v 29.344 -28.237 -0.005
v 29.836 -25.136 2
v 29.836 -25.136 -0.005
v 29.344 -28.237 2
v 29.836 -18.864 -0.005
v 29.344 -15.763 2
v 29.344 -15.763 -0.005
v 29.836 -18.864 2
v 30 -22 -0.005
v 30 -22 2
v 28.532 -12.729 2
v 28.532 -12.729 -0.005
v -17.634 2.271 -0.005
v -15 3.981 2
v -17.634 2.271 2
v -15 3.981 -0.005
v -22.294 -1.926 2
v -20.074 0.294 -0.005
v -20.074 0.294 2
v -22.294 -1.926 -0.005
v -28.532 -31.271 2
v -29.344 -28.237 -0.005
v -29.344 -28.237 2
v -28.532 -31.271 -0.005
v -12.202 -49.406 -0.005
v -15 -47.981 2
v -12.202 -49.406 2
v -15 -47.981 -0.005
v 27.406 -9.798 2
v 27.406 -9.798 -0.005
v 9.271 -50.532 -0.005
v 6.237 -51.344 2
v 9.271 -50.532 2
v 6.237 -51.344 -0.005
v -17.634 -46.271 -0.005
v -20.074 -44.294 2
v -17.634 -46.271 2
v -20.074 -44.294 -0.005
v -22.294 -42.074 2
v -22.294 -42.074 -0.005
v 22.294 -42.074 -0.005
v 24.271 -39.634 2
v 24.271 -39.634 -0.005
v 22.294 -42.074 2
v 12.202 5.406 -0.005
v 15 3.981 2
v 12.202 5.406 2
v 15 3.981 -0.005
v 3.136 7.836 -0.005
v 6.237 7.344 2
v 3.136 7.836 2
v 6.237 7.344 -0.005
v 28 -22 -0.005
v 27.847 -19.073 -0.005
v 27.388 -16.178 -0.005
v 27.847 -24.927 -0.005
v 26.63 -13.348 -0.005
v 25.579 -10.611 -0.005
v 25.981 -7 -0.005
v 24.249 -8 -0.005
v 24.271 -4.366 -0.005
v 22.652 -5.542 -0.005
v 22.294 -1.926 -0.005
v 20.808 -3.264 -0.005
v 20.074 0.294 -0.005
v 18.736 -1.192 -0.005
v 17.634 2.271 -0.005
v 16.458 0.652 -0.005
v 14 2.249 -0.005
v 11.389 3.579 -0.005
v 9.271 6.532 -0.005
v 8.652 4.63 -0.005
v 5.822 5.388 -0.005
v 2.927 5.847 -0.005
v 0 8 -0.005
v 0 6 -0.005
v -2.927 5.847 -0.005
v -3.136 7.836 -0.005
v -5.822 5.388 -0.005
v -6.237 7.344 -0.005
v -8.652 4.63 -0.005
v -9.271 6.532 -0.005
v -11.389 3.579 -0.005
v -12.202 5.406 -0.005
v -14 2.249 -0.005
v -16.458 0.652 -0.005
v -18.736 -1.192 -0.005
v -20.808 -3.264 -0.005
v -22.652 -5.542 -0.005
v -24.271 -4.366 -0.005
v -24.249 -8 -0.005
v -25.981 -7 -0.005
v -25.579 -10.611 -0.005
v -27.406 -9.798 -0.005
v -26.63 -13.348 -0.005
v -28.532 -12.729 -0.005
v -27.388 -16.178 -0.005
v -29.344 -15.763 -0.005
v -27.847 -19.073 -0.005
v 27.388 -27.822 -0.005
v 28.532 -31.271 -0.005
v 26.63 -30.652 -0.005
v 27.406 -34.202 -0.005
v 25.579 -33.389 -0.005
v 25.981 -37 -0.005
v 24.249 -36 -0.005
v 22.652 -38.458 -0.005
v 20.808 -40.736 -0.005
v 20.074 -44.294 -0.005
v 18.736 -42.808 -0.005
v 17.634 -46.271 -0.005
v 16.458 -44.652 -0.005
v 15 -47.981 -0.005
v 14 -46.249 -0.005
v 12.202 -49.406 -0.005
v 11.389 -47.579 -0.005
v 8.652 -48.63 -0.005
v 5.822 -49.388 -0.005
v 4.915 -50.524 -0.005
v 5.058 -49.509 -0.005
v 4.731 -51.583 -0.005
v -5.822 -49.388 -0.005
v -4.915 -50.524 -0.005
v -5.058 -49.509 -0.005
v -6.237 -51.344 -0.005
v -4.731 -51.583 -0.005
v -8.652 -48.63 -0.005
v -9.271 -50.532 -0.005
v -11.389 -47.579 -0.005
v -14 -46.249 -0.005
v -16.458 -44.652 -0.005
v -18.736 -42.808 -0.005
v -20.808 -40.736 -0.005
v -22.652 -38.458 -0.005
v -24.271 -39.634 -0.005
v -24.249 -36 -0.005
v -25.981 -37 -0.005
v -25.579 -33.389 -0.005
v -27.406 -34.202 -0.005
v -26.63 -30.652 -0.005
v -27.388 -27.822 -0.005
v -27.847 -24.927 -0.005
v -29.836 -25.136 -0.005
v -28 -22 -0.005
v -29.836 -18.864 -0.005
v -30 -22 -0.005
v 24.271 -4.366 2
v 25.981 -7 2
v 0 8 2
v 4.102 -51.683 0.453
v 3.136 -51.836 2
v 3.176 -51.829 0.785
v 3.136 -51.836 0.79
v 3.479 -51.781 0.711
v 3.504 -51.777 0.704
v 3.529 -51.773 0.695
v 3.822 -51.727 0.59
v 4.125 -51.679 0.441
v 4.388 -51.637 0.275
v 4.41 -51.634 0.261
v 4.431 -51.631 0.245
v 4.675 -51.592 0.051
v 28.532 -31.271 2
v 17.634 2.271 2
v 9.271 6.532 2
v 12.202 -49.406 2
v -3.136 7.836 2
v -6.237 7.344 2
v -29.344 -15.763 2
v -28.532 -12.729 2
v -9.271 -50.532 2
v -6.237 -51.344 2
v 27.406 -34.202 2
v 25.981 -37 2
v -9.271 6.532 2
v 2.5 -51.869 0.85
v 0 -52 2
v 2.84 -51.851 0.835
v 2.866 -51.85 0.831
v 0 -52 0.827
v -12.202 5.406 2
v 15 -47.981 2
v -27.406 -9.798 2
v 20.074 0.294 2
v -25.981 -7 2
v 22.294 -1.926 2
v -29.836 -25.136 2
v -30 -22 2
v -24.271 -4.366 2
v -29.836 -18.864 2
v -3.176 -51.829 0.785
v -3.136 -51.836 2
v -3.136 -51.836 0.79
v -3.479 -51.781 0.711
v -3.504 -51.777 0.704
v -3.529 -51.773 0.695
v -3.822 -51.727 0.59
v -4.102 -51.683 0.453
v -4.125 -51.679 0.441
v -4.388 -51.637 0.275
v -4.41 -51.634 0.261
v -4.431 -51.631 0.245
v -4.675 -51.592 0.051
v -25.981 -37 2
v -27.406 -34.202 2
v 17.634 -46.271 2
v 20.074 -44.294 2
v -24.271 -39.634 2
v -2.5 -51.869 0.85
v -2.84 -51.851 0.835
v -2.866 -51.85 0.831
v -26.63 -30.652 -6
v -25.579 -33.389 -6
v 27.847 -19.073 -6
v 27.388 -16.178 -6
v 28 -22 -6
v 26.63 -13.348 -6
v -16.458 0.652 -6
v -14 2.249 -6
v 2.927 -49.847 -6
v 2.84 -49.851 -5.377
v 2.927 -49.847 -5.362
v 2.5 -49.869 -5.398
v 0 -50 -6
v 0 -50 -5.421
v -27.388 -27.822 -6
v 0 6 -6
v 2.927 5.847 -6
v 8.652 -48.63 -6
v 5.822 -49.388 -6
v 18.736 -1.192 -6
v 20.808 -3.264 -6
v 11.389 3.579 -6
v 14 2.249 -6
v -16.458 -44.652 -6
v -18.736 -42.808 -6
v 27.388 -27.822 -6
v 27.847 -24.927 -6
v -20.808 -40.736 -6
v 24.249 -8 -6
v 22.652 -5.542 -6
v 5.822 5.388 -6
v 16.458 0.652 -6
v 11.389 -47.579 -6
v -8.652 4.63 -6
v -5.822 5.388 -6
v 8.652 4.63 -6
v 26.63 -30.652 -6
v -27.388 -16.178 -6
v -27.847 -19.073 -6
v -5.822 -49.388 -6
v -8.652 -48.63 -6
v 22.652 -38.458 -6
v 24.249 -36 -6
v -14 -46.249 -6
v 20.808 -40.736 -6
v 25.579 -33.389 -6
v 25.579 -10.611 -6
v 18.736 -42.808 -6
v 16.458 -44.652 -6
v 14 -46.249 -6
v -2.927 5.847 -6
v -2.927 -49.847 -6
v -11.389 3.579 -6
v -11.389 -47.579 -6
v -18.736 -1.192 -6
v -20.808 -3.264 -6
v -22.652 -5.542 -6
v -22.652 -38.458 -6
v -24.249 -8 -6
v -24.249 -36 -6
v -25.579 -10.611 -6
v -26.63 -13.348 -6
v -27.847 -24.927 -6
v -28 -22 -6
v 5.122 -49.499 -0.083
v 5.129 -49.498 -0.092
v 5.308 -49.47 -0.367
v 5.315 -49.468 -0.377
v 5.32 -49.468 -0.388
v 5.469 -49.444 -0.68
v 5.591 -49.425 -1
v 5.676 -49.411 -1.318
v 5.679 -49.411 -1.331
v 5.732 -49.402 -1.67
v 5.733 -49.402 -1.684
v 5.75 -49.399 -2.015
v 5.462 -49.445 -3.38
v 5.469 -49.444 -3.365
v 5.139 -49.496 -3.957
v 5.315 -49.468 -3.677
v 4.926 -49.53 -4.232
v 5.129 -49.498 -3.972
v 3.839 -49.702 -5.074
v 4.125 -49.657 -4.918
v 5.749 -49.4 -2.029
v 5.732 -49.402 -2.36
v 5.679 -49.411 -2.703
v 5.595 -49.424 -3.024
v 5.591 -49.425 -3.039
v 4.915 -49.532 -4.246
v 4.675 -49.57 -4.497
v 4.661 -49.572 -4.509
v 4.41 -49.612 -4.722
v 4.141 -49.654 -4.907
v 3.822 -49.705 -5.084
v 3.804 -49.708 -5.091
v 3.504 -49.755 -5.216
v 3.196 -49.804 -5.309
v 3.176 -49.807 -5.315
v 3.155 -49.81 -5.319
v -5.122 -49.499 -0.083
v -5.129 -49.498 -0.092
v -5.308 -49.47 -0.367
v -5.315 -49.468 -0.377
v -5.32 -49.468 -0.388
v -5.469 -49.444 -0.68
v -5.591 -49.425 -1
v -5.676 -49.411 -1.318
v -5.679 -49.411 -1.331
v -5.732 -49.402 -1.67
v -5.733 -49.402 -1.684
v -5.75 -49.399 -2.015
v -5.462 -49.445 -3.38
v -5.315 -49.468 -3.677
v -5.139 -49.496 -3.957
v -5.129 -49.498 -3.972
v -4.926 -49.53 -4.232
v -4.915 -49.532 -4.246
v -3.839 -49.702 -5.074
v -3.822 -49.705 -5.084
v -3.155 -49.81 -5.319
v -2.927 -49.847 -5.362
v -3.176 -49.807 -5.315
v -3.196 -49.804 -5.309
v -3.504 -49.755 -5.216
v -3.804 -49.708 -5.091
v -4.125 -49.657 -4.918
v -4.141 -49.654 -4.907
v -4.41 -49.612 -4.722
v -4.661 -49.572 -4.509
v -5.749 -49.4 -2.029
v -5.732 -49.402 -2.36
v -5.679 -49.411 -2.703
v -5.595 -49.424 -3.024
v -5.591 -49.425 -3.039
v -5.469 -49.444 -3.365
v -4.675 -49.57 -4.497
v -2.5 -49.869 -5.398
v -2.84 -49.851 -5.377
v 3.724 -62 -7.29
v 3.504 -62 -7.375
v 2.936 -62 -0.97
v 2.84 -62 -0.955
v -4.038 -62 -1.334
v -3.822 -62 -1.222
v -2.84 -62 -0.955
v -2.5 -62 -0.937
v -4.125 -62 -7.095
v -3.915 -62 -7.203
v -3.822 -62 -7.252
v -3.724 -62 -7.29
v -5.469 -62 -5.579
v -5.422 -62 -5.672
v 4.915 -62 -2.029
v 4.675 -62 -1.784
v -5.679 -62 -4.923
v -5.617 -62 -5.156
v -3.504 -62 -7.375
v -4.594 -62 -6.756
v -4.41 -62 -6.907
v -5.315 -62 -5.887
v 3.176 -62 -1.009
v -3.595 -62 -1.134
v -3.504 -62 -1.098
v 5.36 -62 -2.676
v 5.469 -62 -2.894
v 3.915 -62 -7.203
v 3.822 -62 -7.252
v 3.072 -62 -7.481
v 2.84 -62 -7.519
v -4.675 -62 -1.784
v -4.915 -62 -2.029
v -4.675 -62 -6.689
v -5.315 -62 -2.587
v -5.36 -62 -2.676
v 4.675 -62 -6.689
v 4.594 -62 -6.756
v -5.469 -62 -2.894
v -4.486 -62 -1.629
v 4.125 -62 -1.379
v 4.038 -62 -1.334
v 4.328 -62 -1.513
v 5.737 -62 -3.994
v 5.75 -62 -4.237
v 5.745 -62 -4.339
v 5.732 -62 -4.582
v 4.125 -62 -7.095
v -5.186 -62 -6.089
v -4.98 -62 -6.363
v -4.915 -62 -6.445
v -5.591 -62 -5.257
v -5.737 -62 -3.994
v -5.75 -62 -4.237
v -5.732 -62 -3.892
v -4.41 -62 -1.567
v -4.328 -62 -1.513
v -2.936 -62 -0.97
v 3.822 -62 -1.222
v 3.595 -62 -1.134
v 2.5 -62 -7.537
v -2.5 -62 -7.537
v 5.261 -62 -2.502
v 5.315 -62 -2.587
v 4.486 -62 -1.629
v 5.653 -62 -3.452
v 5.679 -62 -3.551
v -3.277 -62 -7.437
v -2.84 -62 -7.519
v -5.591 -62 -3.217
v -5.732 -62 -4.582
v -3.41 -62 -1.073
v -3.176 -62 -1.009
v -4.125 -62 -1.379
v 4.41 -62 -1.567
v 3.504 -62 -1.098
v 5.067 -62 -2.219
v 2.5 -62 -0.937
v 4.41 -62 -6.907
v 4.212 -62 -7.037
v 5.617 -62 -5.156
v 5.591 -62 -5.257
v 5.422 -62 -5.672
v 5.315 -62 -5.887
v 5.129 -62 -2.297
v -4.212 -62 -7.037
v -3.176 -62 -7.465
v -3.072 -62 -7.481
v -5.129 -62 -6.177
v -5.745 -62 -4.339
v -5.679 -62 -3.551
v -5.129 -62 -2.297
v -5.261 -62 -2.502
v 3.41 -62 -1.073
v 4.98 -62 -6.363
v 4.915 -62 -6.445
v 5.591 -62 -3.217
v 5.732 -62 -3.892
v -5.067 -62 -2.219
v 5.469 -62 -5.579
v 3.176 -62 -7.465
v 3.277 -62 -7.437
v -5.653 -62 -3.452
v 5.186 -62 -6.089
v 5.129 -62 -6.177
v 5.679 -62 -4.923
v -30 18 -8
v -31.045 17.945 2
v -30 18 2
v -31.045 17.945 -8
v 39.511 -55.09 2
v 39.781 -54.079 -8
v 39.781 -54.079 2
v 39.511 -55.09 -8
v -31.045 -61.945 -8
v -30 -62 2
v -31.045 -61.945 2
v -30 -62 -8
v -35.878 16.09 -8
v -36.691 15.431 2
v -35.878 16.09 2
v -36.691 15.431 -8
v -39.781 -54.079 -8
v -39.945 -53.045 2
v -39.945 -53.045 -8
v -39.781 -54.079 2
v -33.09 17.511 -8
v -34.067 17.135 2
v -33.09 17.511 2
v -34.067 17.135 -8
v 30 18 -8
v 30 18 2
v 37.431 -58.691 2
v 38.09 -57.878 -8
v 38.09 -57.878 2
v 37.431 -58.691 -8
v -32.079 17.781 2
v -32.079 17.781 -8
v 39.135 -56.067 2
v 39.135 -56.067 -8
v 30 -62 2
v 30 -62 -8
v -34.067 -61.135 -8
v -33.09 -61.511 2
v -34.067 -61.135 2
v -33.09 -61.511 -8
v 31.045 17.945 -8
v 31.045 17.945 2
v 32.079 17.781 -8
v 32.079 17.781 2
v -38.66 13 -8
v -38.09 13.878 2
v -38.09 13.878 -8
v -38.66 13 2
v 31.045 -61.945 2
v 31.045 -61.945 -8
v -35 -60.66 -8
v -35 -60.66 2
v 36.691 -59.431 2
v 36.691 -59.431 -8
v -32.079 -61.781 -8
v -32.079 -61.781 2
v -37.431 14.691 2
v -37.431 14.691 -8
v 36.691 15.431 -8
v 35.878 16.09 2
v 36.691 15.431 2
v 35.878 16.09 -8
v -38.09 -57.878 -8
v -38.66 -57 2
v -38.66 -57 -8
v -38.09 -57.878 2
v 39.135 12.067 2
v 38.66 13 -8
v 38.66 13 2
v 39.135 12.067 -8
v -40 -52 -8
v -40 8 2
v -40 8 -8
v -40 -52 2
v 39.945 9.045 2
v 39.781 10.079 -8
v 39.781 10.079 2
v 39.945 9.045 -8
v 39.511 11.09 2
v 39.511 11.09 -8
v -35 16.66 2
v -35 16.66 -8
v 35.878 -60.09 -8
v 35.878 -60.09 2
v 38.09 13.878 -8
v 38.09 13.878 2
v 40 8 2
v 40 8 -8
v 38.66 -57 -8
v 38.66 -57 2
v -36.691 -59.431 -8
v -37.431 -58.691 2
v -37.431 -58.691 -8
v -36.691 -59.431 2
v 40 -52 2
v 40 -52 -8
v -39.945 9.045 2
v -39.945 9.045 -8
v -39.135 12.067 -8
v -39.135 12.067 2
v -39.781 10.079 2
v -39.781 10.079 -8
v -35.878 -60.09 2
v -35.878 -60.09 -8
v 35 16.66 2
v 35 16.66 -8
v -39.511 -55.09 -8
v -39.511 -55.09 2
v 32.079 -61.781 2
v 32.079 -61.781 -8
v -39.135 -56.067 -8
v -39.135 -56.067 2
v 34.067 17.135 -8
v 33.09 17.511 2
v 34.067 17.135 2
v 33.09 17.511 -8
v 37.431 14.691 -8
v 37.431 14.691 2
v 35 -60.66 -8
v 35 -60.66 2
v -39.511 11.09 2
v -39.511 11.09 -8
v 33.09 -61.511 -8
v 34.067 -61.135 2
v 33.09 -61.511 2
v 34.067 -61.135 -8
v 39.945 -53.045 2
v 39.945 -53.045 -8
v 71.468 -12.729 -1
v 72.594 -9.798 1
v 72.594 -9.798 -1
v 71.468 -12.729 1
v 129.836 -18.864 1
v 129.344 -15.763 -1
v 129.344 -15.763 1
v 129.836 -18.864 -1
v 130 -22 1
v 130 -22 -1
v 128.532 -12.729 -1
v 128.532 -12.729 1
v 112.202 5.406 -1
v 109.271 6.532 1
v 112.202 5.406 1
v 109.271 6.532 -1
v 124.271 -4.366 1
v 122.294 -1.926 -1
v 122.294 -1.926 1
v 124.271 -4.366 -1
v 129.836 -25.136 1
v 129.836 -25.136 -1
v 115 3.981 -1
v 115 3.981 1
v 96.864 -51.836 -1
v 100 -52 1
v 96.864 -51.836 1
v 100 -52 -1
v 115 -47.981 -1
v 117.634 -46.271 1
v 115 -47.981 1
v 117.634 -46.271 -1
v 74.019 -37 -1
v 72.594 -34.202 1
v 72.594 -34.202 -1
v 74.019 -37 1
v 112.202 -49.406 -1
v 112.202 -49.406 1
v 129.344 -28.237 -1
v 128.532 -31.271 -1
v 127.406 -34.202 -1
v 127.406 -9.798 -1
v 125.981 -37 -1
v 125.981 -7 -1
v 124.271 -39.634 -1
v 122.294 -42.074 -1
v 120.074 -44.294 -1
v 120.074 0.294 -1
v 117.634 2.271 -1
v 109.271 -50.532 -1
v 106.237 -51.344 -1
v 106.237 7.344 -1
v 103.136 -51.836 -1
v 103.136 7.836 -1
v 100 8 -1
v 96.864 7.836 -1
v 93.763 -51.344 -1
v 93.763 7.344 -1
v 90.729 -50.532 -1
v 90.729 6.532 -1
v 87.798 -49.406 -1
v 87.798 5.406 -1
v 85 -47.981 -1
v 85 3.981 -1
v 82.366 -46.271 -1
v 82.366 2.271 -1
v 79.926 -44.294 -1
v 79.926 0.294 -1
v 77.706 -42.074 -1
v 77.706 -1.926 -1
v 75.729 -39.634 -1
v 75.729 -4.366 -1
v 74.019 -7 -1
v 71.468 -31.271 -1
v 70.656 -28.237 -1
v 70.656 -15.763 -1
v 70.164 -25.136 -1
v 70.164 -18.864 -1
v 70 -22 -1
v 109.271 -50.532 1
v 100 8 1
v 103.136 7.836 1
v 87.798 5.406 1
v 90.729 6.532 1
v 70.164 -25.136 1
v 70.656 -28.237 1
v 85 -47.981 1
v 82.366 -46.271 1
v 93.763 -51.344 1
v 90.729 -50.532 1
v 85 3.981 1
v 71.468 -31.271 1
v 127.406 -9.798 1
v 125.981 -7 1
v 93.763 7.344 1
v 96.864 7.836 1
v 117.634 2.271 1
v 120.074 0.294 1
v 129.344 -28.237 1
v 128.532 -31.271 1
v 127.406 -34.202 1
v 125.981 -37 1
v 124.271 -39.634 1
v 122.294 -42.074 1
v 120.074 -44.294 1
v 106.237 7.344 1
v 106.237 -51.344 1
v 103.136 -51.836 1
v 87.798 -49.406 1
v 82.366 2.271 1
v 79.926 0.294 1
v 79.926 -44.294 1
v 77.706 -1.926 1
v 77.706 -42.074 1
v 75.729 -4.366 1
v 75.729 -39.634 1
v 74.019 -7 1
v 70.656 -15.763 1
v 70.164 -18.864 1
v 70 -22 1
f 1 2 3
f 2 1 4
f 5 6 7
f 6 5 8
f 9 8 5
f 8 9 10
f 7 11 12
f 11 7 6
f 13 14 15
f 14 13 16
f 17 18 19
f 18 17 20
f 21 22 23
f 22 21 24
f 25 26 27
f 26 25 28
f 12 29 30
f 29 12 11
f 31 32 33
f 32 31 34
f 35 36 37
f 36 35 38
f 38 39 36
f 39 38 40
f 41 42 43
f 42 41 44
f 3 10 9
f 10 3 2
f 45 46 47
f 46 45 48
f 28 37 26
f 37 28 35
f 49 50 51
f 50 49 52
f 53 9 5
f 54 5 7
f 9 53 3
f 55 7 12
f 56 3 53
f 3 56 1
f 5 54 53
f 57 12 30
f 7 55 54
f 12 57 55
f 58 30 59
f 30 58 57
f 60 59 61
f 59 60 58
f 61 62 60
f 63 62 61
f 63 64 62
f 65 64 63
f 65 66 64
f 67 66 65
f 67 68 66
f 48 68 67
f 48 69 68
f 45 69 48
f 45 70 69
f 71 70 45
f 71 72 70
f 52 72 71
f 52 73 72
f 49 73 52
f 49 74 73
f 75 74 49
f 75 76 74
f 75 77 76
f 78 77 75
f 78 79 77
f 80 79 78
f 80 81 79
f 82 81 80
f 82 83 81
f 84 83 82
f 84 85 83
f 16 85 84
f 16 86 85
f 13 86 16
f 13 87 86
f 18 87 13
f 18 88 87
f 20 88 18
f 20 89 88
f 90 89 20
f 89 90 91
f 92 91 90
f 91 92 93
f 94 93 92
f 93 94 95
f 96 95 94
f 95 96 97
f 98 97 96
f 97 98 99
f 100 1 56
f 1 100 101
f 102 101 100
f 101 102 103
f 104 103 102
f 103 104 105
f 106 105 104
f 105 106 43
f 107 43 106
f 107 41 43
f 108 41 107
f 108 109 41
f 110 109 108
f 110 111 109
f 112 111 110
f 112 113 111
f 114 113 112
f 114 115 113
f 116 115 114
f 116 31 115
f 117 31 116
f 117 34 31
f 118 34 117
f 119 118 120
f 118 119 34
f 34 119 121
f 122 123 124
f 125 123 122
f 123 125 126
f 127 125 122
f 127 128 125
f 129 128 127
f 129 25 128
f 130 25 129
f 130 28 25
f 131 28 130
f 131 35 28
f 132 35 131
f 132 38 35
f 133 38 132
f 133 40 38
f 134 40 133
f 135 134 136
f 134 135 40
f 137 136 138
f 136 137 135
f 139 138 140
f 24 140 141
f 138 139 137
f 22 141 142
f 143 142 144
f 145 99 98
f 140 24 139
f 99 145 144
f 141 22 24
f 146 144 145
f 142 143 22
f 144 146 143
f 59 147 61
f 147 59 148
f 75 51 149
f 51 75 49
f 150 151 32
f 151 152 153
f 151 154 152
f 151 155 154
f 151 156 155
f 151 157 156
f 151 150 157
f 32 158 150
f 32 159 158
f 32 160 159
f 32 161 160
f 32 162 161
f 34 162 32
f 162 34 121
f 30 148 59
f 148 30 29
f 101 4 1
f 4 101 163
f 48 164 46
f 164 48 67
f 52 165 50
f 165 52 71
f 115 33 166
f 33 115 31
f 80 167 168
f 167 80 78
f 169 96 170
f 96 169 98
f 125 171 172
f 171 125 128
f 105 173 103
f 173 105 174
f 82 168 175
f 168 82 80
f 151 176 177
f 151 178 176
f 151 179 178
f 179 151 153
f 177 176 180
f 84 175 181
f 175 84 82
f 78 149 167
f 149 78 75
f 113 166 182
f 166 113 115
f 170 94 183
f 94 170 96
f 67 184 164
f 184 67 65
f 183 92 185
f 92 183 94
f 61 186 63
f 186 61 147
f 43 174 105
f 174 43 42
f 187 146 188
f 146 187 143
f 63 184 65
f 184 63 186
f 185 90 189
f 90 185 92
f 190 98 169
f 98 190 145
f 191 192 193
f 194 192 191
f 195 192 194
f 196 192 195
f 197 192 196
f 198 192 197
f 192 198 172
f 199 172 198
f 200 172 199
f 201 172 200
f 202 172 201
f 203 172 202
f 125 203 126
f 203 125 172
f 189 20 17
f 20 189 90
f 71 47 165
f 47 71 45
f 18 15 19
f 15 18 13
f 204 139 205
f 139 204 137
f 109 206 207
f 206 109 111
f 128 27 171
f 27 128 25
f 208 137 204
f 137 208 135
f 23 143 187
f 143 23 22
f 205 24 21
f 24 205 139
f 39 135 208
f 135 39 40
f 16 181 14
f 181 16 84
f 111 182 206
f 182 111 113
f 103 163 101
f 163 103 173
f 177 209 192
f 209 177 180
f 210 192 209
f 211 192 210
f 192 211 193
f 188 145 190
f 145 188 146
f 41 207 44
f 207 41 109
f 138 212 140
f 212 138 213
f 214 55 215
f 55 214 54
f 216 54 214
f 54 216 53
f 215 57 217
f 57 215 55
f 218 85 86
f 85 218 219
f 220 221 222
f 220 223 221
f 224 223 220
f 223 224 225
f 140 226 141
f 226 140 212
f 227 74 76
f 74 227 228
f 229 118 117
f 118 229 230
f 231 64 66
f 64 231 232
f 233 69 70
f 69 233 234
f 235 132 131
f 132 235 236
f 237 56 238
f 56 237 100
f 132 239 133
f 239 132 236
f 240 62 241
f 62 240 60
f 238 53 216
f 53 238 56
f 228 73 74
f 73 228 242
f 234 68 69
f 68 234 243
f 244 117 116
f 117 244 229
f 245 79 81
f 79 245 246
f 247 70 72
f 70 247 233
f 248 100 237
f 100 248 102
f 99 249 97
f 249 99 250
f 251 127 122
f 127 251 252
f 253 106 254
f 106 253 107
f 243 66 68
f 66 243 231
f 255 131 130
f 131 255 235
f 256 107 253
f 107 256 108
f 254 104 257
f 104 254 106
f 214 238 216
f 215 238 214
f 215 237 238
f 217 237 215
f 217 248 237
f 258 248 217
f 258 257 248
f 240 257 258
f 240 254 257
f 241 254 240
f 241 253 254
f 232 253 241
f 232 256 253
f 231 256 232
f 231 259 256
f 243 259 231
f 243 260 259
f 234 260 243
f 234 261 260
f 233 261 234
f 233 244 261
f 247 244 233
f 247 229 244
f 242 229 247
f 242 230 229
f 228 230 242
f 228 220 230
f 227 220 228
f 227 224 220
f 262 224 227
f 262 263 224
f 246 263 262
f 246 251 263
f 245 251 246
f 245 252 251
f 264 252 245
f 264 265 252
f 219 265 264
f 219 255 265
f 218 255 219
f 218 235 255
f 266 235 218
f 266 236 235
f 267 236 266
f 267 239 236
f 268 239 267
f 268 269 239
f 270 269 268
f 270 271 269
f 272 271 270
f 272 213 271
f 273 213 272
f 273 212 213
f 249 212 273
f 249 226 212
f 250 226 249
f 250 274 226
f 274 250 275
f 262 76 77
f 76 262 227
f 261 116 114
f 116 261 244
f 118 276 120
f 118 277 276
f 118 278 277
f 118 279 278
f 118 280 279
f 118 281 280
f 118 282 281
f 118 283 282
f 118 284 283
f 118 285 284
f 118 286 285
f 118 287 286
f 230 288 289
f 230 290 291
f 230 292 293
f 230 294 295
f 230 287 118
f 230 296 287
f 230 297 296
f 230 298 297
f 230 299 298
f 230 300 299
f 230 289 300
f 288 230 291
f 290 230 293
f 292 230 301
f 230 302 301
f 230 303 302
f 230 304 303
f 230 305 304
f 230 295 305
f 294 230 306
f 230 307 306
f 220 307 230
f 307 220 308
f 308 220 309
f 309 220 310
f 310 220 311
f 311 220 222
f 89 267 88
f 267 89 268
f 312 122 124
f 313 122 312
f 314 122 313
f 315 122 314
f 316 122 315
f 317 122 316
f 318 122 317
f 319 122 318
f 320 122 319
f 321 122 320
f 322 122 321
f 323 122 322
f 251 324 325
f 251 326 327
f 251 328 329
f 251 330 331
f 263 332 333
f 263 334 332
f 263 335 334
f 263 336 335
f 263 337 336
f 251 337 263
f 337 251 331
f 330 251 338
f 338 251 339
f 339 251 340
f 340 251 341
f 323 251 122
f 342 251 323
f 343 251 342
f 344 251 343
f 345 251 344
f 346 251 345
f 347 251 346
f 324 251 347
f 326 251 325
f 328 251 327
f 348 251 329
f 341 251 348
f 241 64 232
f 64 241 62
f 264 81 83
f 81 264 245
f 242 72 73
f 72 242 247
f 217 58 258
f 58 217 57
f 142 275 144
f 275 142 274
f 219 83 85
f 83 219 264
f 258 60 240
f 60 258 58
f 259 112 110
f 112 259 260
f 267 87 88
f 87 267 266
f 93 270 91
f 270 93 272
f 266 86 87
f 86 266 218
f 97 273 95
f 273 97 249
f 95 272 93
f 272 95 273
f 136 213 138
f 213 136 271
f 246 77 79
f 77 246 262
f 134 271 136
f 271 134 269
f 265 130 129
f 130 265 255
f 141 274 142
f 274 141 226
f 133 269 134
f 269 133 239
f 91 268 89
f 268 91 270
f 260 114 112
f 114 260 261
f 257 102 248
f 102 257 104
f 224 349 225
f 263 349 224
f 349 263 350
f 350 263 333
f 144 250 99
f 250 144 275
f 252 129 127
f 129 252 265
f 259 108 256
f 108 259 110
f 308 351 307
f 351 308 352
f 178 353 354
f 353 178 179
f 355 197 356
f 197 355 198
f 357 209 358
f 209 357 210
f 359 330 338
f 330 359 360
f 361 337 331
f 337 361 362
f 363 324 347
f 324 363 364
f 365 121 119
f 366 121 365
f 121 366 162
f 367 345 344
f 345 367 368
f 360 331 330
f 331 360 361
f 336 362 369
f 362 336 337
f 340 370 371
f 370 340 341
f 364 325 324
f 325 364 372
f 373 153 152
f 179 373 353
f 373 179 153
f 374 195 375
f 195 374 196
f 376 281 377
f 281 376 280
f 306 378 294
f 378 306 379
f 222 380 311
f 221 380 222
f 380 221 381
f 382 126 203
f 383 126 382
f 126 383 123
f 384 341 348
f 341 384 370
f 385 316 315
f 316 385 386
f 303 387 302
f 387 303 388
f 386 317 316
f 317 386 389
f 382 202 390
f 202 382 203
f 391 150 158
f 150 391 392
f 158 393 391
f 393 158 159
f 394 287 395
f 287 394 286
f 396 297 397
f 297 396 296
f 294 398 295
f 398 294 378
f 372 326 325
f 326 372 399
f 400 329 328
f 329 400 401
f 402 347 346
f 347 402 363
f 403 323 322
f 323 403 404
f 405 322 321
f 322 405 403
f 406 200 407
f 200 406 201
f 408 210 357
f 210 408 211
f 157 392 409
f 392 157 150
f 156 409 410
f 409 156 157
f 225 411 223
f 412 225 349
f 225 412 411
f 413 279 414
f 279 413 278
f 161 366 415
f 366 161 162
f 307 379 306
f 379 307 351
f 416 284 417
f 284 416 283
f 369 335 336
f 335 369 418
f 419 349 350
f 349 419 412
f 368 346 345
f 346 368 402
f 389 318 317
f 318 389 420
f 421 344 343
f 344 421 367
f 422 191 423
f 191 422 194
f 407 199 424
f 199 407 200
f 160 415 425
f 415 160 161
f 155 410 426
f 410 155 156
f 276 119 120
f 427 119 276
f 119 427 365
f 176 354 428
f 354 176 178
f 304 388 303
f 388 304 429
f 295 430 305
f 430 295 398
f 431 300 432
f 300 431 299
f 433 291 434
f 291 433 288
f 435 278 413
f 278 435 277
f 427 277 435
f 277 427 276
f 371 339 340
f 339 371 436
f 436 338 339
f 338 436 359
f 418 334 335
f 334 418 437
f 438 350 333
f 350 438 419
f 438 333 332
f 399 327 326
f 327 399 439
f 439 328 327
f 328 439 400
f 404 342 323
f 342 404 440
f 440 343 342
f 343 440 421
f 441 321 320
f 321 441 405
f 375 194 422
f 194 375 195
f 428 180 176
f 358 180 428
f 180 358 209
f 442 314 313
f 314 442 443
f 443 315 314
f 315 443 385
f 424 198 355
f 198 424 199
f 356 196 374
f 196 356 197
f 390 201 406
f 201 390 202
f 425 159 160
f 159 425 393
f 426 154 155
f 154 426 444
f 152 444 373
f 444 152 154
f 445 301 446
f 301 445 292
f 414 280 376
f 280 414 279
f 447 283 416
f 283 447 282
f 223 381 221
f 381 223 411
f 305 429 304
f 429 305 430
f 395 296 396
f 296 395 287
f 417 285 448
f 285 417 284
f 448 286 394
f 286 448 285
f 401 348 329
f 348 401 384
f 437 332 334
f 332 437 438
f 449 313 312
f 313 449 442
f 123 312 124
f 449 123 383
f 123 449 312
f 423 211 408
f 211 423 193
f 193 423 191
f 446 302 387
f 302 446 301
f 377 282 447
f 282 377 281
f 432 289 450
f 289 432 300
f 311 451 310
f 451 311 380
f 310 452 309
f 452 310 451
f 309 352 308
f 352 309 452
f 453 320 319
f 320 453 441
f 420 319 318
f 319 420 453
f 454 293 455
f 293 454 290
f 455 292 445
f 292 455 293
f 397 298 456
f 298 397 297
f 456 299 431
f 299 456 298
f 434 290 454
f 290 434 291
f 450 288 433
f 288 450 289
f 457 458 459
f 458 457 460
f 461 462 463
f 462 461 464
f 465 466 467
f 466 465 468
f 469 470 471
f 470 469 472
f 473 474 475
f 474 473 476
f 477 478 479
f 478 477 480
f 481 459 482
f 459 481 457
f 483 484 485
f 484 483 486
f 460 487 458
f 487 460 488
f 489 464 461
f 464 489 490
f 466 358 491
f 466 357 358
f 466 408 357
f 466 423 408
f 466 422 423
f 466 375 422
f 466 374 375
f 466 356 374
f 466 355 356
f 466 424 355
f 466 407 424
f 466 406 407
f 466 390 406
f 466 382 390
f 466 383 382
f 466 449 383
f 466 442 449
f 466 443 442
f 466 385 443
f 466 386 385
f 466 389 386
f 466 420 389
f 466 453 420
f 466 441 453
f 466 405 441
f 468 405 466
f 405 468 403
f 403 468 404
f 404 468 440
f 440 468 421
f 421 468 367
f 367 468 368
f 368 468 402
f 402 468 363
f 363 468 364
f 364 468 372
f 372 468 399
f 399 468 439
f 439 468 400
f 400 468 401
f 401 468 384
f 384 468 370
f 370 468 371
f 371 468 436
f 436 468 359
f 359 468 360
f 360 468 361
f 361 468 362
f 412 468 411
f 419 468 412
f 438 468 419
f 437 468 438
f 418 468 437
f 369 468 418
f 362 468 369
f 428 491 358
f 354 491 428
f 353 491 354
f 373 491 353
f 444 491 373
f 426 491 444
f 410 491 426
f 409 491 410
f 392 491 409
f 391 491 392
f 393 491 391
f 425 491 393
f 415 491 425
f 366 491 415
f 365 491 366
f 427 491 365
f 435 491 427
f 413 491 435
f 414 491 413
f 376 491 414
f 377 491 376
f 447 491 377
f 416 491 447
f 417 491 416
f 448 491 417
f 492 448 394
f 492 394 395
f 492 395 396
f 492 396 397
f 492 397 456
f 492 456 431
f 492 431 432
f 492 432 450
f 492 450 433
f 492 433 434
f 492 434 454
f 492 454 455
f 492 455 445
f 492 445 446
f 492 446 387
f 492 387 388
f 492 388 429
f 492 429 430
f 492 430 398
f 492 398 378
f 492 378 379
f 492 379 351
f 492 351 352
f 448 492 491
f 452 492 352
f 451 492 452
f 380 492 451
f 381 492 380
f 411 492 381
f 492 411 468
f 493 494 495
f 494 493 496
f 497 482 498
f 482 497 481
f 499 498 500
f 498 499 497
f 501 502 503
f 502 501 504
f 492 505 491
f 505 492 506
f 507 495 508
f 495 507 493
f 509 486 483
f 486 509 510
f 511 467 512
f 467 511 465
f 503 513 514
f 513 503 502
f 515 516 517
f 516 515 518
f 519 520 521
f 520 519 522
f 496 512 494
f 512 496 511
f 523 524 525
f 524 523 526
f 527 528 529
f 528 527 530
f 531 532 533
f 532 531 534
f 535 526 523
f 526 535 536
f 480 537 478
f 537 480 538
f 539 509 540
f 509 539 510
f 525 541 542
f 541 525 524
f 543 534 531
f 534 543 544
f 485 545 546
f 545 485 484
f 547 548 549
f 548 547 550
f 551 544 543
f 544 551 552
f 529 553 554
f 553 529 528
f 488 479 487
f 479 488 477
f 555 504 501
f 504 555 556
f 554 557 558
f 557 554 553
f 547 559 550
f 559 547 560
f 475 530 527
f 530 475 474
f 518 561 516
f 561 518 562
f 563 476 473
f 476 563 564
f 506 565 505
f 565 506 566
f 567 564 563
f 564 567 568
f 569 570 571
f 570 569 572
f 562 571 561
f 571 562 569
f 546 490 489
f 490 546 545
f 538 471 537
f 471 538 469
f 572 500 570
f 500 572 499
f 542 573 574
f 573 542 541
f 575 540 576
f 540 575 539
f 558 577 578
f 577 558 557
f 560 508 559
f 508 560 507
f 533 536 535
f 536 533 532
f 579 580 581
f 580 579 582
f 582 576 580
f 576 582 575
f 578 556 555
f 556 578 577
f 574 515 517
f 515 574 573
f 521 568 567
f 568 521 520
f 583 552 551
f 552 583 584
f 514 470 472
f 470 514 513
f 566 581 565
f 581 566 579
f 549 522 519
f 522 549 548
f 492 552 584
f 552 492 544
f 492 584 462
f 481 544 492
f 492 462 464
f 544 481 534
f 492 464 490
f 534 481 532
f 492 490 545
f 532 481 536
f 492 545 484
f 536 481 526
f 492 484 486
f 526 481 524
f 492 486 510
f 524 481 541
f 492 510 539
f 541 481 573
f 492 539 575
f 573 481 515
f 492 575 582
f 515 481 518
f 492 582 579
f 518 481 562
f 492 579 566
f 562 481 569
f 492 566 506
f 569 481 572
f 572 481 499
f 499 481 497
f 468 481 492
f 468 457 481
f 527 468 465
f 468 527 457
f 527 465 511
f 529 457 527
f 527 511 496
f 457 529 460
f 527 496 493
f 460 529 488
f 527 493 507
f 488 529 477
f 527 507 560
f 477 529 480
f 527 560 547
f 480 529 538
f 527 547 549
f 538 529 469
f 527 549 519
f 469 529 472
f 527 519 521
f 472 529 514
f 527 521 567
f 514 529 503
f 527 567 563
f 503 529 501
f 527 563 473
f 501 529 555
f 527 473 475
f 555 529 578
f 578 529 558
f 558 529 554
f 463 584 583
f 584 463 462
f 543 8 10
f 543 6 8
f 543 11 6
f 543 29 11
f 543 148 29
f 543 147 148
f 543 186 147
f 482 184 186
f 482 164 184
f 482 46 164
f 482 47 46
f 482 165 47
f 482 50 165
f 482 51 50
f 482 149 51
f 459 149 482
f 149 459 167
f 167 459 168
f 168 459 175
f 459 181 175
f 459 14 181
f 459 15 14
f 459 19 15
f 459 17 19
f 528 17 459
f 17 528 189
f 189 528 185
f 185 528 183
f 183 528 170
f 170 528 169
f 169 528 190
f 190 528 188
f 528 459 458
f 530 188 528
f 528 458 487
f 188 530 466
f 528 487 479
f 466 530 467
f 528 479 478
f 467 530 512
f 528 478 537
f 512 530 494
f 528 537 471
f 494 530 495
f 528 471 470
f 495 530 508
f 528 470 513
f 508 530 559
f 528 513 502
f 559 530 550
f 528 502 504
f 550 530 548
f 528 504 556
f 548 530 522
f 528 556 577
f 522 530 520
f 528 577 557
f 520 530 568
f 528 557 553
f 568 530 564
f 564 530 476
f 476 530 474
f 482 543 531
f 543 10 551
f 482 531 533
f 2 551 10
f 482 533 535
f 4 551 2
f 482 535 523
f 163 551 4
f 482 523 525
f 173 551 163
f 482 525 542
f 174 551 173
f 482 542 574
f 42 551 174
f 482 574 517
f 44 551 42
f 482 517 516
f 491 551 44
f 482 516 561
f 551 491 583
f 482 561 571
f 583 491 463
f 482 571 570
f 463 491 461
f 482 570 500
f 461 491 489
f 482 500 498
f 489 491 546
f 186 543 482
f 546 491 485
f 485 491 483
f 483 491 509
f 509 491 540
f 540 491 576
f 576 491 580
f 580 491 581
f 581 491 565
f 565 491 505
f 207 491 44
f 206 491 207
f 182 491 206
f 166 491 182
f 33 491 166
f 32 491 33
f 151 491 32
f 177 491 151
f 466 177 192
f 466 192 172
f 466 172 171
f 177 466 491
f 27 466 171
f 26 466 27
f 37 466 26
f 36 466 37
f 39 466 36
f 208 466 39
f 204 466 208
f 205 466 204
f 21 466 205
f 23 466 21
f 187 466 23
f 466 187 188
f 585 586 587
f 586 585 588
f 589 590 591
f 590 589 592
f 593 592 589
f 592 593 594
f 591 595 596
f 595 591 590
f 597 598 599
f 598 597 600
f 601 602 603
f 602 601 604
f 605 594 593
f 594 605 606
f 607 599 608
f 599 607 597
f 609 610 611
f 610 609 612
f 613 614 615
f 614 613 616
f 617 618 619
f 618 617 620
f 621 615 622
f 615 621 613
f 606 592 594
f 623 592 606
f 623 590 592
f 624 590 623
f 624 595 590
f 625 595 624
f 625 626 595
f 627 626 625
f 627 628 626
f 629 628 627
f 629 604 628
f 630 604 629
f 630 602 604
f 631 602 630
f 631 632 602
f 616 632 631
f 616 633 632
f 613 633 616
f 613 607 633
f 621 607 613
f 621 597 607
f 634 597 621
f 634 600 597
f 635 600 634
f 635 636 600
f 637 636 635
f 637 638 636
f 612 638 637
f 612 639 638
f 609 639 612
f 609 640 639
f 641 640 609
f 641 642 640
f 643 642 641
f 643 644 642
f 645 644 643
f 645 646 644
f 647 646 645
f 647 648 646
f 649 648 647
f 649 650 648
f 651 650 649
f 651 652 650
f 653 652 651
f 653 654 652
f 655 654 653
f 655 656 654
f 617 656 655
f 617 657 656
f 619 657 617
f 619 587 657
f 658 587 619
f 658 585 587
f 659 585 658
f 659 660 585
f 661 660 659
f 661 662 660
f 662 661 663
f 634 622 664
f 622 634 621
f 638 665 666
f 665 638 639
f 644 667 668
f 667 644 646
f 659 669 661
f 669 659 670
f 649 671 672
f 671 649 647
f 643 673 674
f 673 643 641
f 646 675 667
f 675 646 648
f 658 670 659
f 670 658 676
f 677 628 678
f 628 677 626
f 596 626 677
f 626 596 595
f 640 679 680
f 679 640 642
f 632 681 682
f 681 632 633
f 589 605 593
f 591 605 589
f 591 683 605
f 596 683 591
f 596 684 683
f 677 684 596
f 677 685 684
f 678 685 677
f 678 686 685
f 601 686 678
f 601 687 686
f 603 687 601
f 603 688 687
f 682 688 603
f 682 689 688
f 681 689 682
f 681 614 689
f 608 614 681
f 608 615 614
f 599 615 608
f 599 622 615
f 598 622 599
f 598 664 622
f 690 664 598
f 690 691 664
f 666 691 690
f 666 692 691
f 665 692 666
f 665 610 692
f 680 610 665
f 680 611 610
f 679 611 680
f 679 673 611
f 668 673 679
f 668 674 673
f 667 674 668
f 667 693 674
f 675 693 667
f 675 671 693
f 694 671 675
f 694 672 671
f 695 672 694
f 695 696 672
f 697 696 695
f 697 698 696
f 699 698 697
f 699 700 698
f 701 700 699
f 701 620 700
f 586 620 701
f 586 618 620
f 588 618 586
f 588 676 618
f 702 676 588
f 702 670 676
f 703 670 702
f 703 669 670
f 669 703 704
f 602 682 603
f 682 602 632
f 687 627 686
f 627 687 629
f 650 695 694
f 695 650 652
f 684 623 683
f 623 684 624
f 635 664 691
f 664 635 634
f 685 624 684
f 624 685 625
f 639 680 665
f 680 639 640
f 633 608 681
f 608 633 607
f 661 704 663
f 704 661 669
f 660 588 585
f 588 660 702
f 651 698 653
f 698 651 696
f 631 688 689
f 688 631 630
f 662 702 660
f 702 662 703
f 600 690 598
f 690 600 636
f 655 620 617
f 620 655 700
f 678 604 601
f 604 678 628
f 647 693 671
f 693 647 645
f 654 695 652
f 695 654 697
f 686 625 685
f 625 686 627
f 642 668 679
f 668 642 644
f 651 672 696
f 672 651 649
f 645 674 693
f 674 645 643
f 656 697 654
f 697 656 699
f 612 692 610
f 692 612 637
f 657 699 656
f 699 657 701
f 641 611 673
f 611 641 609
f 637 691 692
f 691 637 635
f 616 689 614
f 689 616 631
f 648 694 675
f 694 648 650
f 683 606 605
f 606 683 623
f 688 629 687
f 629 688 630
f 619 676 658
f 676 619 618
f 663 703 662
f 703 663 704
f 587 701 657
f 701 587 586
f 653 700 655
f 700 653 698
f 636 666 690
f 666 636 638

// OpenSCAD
// file: ../Lib/mirrorcopy.scad
module mirrorCopy(vec=[1,0,0], vec2=[0,0,0], vec3=[0,0,0]){
    
    //echo(str("Vec1=",vec," Vec2=", vec2, " Vec3=", vec3));
    children();
    mirror(vec) children();

    if(vec2){    
        mirror(vec2){
            children();
            mirror(vec) children();
        }
    }

    if(vec3){
        mirror(vec3){
            children();
            mirror(vec) children();
            mirror(vec2){
                children();
                mirror(vec) children();
            }
        }
    }
    
} 

mirrorCopy([1,0,0])color("green")translate([5,10,0])cylinder(h=1,d=5,center=true);
mirrorCopy([1,0,0],[0,1,0])color("blue")translate([10,5,0])cylinder(h=1,d=5,center=true);
mirrorCopy([1,0,0],[0,1,0],[0,0,1])color("red")translate([15,10,5])cylinder(h=1,d=5,center=true);
// main file
mountOffset= [0,12,0];
angleOfTheDangle=41;
cradleOffset = [0,70,90];

use <../Lib/mirrorcopy.scad>
$fn=$preview?30:60;

//color("green")translate([-3.5,0,0])import("Backpack_for_Titan_-_large_slits.stl");

module titan(){
    color("salmon")
    translate([0,11,0])
        hull(){
            translate([0,0,2.5])
                cube([79,150,1], center=true);
            translate([0,0,2.5+8+.5])
                cube([93,150,8], center=true);
            translate([0,0,18.5])
                cube([85,150,1], center=true);
            translate([0,-66.5-10,2.5+8])
                cube([57,1.1,17], center=true);    
        }
        translate([0,-66-5,2.5+8])
                cube([57,10,17], center=true);    
}

//titan();
radius=5;
module clamshell_body(){
    hull(){
        mirrorCopy(){
            translate([48.5+1-radius,-27,19-radius])
                rotate([90,0,0])
                    cylinder(h=80,r=radius, center=true);
            translate([48.5+1-radius/2,-27,0+radius/2])
                cube([radius, 80, radius], center=true);
                    //cylinder(h=80,r=radius, center=true);
        }
    }
}


module clamshell_back(){
    hull(){
        mirrorCopy(){
            translate([30.5,68,1])cylinder(h=2, r=radius, center=true);
            translate([43.5+1,13,1])cylinder(h=2, r=radius, center=true);
            translate([43.5+1,-62,1])cube([radius*2,radius*2,2], center=true);
        }
    }
}

module clamshell(){
    difference(){
        union(){
            clamshell_body();
            clamshell_back();
        }
        titan();
    }
}

    
module screw(){
    translate([0,-21+30,0+1]){
        hull(){
            translate([0,0,-5+0.01])cylinder(h=30, d=6.2, center=true);
            translate([0,15.4-14,-5+0.01])cylinder(h=30, d=6.2, center=true);
        }
        translate([0,0,3]){
            #hull(){
                translate([0,0,0-0.01])cylinder(h=1, d=16, center=true);
                translate([0,-17,150-0.01])cylinder(h=1, d=30, center=true);
                translate([0,15.4-14,0-0.01])cylinder(h=1, d=16, center=true);
                translate([0,-17+15.4-14,150-0.01])cylinder(h=1, d=30, center=true);
            }
            
        }
    }
}

module holes(){
    translate(mountOffset)
        screw();
    rotate([-18.7,0,0])
        translate([0,57.31,125.0635])
            cube([100,30,30], center=true);
    translate(cradleOffset)rotate([-90+angleOfTheDangle,0,0]){
        translate([0,-10,+2.5]){
            color("green")
                qi_charger();
        }
    }
}

module mount(){
    translate(mountOffset)translate([0,-21+30,2.35/-2]){
            hull(){
                cylinder(d=14,h=2.35, center=true);
                translate([0,15.4-14,0])
                    cylinder(d=14,h=2.35, center=true);
            }
        }

    hull(){
        translate(mountOffset)color("orange")hull(){
            translate([0,-12.2,0])cylinder(d=31.2,h=2, center=true);
            translate([0,13.75,0])cylinder(d=28,  h=2, center=true);

            mirrorCopy(){
                translate([(33-10)/2,1.5,0])
                cylinder(d=10, h=2, center=true);
            }
        }
        
        joinball();
    }
}


module joinball(){
    translate([0,5,30]){
        sphere(23);    
        translate([0,15,0])
            sphere(23);    
    }
}

module platform(){
    color("pink")translate(cradleOffset)rotate([-90+angleOfTheDangle,0,0]){
        translate([0,-10,+2.5]){
            clamshell();
        }
    }
    hull(){
        translate(cradleOffset)rotate([-90+angleOfTheDangle,0,0]){
            translate([0,-10,+2.5])
                color("blue")clamshell_back();
        }
        joinball();
    }
    /*hull(){
        #translate([0,40,80])rotate([90+25,0,0])hull(){
            mirrorCopy([1,0,0])mirrorCopy([0,1,0]){
                translate([25,25,0])cylinder(h=5, d=20, center=true);
            }
        }
        joinball();
    }*/
}
module plastic(){
    platform();
    mount();
}


module flattener(){
    translate([0,-21.5,100])rotate([.7,0,0])cube([100,10,210], center=true);
}
module sectioner(){
    translate([50,30,100])cube([100,100,210], center=true);
}


module scooter_mount(){
    translate([0,-6,28])rotate([90+18.7,0,0])difference(){
        plastic();
        //qi_charger();
        holes();
        //flattener();
        //scale($preview?1:0)sectioner();
    }
}

module qi_charger(){
    translate([0,-22,-3]){
        translate([0,0,4])
            cylinder(d=60,h=2.01, center=true);
        cylinder(d=56,h=6, center=true);
        translate([0,-50,-3])
            rotate([90+10,0,0])
                hull()
                    mirrorCopy()
                        translate([2.5,0,0])
                            cylinder(d=6.5,h=50, center=true);
        
        //translate([0,-50,0])
        //    cube([11,50,6], center=true);
    }
}
//scooter_mount();
//clamshell();
difference(){
    translate([0,-22,-3]){
        hull()mirrorCopy([0,1,0])mirrorCopy([1,0,0])translate([40-(20/2),40-(20/2),0])cylinder(d=20, h=10, center=true);
    }
    #qi_charger();
    
}

translate([100,-22,0])cylinder(d=60,h=2, center=true);
